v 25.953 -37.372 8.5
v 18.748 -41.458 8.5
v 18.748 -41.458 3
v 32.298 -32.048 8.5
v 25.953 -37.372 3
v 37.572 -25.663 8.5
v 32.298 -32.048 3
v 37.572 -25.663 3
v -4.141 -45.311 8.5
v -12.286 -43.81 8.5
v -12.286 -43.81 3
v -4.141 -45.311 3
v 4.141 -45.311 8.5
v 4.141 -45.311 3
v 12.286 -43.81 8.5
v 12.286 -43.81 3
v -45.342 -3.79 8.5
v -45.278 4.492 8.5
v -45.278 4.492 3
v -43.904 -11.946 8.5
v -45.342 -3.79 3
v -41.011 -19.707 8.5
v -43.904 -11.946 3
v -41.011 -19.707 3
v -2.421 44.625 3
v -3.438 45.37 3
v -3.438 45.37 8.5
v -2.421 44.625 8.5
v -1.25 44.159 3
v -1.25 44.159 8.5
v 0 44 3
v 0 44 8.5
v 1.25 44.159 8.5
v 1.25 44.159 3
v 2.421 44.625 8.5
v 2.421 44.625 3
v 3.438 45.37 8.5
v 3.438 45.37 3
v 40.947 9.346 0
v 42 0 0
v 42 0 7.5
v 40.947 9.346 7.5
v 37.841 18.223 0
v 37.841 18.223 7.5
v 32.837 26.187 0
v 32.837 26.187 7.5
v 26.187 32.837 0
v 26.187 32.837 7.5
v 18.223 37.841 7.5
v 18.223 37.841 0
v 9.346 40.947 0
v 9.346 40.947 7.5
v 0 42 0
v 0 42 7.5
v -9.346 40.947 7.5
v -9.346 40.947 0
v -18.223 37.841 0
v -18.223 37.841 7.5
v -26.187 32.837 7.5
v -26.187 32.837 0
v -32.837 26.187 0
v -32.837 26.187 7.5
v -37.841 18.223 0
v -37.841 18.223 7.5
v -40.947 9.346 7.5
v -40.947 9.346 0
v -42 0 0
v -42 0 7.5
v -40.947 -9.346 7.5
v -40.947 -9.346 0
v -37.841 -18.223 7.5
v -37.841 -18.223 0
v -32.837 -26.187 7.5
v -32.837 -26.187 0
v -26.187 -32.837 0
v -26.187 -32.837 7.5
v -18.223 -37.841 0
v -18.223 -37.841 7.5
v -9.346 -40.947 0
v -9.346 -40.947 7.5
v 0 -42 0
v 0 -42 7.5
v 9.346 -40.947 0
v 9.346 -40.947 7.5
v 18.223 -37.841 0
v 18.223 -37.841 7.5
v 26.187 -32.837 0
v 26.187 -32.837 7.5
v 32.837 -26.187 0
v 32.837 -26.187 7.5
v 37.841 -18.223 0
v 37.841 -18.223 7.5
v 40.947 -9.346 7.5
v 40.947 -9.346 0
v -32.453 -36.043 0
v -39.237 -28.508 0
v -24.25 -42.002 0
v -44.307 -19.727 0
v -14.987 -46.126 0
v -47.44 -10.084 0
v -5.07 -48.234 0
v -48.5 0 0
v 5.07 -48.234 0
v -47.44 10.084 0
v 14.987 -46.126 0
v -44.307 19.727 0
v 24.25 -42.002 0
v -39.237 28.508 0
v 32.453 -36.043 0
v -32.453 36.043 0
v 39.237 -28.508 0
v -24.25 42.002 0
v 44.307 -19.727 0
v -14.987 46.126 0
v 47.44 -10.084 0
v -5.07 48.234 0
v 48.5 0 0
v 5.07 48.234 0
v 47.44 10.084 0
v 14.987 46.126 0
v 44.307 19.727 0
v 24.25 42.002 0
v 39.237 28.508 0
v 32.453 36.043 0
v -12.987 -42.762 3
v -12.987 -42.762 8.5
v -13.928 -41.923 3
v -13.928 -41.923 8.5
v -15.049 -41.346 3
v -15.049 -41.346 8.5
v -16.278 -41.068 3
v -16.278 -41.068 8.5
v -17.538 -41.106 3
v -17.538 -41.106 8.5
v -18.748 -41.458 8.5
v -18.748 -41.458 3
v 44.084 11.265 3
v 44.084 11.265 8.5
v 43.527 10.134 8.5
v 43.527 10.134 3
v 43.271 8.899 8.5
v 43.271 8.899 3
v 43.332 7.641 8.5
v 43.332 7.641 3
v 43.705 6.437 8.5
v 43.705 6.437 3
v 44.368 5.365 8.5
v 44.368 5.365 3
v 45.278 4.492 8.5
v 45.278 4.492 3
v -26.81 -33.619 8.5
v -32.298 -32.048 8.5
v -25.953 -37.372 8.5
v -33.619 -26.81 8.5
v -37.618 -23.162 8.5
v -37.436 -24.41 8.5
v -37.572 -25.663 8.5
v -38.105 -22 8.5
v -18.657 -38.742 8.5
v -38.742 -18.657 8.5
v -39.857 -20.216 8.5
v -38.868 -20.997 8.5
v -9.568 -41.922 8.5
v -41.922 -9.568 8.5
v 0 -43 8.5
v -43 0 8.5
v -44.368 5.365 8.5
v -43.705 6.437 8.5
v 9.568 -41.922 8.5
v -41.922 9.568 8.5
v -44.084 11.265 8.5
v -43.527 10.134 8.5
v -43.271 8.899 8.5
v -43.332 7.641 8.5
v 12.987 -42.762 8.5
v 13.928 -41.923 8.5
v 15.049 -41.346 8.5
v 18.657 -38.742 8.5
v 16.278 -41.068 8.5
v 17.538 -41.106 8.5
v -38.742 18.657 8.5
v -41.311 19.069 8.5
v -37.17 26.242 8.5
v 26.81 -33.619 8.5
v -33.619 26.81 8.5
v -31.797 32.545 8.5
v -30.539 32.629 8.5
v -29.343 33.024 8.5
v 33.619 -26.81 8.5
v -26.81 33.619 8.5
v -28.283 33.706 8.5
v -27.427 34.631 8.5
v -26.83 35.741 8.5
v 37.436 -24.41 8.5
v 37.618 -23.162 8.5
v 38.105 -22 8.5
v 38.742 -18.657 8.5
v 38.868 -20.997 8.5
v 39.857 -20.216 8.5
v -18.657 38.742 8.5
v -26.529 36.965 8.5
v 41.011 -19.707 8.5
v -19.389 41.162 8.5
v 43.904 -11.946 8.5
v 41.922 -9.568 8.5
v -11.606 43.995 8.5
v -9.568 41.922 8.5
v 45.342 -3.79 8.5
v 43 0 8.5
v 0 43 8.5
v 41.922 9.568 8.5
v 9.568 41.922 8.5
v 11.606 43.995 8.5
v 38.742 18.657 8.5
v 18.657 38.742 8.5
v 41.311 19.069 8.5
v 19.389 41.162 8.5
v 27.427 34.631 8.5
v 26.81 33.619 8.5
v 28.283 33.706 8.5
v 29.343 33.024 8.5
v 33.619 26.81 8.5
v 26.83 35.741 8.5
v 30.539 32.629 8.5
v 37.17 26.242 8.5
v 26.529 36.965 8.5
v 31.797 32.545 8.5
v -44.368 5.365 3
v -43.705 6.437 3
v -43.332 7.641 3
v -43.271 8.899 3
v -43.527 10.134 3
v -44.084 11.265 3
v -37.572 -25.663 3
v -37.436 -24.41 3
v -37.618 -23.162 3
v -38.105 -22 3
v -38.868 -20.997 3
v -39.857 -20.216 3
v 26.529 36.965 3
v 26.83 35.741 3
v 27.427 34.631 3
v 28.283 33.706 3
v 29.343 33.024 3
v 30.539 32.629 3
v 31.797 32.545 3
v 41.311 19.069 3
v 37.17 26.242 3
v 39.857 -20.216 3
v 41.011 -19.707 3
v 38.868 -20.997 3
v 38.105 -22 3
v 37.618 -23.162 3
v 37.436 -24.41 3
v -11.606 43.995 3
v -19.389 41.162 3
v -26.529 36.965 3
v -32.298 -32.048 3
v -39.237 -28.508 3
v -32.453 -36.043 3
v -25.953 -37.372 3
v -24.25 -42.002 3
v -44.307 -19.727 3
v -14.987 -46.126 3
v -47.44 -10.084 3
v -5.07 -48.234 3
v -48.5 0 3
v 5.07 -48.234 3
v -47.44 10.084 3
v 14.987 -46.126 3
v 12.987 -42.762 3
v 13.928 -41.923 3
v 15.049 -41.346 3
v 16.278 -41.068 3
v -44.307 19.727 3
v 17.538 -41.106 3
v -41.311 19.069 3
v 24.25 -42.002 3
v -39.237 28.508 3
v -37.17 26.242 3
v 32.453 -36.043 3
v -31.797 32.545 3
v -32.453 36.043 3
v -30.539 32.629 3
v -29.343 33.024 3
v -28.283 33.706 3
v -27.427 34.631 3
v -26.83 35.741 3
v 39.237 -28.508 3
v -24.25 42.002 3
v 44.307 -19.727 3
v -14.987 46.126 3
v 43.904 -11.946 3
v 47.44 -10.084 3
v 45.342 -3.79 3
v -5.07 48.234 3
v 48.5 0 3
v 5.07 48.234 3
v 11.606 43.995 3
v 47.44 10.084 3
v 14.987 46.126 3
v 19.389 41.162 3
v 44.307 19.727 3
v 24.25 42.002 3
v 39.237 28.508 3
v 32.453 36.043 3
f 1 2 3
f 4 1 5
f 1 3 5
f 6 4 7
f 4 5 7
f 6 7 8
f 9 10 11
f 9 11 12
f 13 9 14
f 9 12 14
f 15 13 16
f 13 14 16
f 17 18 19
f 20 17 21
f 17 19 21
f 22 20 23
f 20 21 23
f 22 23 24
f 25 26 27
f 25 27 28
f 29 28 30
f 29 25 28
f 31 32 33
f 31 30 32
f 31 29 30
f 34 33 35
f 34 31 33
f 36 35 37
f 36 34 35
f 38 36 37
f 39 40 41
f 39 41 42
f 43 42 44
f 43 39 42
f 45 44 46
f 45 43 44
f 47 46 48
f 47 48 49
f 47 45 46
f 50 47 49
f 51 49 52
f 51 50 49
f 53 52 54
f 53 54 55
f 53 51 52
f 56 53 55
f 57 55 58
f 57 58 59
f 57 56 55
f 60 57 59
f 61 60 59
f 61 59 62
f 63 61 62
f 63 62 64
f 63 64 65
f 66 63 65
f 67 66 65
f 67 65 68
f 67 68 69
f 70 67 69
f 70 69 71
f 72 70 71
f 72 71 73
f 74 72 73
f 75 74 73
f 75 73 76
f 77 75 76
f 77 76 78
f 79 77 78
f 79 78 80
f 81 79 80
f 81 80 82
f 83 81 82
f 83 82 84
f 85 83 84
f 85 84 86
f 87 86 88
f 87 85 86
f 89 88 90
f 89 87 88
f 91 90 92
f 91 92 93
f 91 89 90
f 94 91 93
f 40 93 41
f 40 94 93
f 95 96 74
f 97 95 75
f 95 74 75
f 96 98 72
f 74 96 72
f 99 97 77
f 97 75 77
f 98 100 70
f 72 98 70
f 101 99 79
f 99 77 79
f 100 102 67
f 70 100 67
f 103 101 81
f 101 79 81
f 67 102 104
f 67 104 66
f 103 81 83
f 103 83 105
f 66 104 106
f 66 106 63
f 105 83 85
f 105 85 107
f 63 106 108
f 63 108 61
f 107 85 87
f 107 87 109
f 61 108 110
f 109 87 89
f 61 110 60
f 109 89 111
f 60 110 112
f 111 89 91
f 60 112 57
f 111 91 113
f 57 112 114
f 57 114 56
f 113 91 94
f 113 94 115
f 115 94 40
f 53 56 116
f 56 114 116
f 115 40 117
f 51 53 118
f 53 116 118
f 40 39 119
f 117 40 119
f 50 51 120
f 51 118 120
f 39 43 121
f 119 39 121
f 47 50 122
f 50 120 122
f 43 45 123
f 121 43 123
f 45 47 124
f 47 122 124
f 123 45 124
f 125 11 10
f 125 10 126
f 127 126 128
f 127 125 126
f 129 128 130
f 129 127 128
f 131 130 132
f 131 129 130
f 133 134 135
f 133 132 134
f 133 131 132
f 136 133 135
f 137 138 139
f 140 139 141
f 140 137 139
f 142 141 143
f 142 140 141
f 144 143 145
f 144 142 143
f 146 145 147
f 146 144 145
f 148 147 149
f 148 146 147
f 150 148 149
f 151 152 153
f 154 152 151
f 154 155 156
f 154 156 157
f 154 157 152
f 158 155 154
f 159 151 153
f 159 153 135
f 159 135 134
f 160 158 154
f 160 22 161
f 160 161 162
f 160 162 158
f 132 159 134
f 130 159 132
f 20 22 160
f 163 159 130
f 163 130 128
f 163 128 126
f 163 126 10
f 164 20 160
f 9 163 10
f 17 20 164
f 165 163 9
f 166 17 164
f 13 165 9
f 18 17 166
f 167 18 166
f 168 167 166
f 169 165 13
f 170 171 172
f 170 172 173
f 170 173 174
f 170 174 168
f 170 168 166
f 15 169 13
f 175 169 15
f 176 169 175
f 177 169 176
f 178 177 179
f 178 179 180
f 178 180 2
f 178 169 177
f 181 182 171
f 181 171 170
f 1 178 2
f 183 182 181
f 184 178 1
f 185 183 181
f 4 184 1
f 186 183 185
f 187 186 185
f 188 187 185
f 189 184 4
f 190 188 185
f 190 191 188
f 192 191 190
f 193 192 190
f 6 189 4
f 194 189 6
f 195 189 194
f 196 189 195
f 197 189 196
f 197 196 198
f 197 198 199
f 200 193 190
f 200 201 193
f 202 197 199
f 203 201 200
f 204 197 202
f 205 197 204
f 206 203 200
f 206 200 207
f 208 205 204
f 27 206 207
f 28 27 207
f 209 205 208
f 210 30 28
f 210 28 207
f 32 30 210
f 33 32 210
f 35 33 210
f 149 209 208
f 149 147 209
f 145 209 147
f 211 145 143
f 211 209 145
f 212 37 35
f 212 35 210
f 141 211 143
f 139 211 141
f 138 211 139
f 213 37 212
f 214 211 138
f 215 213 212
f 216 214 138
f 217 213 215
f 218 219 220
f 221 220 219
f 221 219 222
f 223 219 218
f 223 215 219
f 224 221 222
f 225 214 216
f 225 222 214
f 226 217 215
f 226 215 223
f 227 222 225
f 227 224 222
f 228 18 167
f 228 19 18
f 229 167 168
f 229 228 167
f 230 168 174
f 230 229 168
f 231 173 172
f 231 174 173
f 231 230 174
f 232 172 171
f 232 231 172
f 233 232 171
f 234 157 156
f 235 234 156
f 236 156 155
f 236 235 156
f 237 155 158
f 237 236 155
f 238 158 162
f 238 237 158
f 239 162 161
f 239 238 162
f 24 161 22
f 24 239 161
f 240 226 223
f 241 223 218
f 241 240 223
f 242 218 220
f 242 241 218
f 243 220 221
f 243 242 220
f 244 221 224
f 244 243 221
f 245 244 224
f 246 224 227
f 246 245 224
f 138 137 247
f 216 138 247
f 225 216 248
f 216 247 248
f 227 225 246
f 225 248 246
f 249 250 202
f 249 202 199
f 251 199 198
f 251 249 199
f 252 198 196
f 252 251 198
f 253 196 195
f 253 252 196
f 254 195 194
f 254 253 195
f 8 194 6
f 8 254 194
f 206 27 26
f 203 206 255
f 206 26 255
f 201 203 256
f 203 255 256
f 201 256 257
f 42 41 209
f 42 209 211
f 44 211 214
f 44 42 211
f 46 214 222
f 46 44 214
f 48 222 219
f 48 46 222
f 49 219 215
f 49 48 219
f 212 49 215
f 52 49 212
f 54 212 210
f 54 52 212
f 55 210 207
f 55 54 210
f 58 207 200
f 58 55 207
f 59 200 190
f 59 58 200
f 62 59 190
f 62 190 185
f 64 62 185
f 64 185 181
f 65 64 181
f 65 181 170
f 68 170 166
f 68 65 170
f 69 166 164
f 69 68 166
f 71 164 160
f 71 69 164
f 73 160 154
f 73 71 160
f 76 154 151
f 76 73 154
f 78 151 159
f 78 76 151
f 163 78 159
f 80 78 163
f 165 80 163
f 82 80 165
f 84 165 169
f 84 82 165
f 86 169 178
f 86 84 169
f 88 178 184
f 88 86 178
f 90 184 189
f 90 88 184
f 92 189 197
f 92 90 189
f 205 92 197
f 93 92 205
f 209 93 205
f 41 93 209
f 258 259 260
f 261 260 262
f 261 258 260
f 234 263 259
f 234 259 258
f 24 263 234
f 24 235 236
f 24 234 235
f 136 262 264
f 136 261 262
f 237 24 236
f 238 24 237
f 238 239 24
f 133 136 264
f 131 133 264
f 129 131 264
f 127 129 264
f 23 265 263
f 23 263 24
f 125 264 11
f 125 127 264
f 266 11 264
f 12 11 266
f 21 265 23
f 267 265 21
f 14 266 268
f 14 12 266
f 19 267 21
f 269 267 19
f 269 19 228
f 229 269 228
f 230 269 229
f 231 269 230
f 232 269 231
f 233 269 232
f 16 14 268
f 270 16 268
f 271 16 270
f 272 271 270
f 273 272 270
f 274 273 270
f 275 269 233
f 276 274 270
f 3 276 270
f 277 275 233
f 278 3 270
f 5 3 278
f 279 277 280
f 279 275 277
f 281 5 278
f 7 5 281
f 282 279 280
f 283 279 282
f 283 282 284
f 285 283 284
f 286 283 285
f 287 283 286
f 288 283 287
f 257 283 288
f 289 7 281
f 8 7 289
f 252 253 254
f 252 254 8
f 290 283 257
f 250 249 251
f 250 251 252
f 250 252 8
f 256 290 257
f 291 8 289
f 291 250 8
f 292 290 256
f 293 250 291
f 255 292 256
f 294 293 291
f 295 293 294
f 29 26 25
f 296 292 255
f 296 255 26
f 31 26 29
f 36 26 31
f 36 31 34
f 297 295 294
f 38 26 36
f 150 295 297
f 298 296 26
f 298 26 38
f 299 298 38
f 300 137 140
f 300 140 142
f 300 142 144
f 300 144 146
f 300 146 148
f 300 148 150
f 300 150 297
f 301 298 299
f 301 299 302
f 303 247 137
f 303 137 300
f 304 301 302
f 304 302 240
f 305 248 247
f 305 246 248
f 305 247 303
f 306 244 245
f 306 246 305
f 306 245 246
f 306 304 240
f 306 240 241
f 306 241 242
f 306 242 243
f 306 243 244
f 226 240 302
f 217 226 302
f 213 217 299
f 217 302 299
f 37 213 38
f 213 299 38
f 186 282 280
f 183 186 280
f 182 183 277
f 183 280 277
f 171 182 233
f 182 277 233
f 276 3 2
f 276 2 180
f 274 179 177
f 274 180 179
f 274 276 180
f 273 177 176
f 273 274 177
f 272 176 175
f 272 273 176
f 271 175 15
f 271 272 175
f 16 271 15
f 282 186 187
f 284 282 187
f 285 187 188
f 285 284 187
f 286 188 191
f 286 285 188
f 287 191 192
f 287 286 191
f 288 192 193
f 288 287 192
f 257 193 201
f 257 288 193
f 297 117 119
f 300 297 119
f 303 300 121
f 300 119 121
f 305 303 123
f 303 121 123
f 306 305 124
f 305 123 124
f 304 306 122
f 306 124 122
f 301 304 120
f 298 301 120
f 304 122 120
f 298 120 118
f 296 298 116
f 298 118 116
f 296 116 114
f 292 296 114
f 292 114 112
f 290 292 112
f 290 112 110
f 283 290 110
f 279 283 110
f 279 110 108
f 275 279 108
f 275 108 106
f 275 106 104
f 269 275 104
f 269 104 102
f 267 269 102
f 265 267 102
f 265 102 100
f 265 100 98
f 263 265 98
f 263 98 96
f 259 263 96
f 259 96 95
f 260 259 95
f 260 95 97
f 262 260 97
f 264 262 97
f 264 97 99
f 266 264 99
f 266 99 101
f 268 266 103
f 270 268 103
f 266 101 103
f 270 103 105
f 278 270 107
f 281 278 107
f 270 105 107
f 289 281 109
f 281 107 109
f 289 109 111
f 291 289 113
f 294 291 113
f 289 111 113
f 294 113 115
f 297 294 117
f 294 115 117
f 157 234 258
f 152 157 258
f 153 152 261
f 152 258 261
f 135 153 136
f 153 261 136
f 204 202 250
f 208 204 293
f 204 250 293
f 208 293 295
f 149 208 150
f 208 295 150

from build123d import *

# Parameters (mm, degrees)
SKETCH_R      = 48.5
SKETCH_R_2    = 42
PAD_DEPTH     = 3
SKETCH001_R   = 45.5
SKETCH001_R_2 = 42
PAD001_DEPTH  = 5.5
CHAMFER_SIZE  = 1
SKETCH002_R   = 5
POCKET_DEPTH  = 5.501


with BuildPart() as part:
    # Sketch → Pad (new body)
    with BuildSketch(Plane.XY):
        Circle(SKETCH_R)
        Circle(SKETCH_R_2, mode=Mode.SUBTRACT)
    extrude(amount=PAD_DEPTH)

    # Sketch001 (on Face4 of Pad) → Pad001 (join)
    with BuildSketch(Plane.XY.offset(3)):
        Circle(SKETCH001_R)
        Circle(SKETCH001_R_2, mode=Mode.SUBTRACT)
    extrude(amount=PAD001_DEPTH)

    # Chamfer
    chamfer_edges = [part.edges().sort_by_distance(p)[0] for p in [
        (-42, 0, 8.5),
    ]]
    chamfer(chamfer_edges, length=CHAMFER_SIZE)

    # Sketch002 → Pocket (cut, through all)
    with BuildSketch(Plane.XY.offset(3)):
        with Locations((31.496593, 37.536178)):
            Circle(SKETCH002_R)
        with Locations((48.25558, 8.508761)):
            Circle(SKETCH002_R)
        with Locations((42.435245, -24.5)):
            Circle(SKETCH002_R)
        with Locations((16.758987, -46.044938)):
            Circle(SKETCH002_R)
        with Locations((-16.758987, -46.044938)):
            Circle(SKETCH002_R)
        with Locations((-42.435245, -24.5)):
            Circle(SKETCH002_R)
        with Locations((-48.25558, 8.508761)):
            Circle(SKETCH002_R)
        with Locations((-31.496593, 37.536178)):
            Circle(SKETCH002_R)
        with Locations((0, 49)):
            Circle(SKETCH002_R)
    extrude(amount=POCKET_DEPTH, mode=Mode.SUBTRACT)


solid = part.part
